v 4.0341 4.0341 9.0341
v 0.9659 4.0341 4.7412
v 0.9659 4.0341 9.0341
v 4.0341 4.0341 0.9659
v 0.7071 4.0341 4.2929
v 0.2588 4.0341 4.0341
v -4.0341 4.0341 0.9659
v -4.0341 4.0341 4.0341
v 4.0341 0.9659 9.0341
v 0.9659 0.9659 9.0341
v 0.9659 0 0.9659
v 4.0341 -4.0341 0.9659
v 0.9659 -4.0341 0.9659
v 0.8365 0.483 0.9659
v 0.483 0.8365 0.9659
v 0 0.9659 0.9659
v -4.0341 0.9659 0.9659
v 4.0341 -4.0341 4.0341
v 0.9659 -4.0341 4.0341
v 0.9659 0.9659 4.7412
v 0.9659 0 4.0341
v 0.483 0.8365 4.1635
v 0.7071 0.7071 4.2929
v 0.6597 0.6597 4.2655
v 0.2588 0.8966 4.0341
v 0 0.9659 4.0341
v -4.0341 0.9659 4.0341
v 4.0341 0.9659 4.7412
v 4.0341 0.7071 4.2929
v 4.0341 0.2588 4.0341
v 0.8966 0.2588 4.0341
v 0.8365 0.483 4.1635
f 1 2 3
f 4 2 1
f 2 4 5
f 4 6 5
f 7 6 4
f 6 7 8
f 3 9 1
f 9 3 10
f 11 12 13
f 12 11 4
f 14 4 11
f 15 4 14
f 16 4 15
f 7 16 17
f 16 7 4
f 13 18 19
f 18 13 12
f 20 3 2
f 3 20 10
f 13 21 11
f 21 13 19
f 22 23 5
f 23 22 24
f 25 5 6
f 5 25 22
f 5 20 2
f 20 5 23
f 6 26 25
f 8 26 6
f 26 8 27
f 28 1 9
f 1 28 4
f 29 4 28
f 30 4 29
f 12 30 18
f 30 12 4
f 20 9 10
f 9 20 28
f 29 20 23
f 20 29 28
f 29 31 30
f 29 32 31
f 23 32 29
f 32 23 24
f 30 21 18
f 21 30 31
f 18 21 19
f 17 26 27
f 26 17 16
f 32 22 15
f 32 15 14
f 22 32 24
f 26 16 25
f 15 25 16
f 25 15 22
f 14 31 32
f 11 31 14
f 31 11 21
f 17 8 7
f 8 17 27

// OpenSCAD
module erode(r) {
    difference() {
        children();
        minkowski() {
            difference() {
                cube(25, center=true);
                children();
            }
            sphere(r);
        }
    }
}

module object() {
    translate([-5,0,0]) cube([10,5,5]);
    translate([0,-5,0]) cube([5,10,5]);
    cube([5,5,10]);
}

erode(1,$fn=12) object();
